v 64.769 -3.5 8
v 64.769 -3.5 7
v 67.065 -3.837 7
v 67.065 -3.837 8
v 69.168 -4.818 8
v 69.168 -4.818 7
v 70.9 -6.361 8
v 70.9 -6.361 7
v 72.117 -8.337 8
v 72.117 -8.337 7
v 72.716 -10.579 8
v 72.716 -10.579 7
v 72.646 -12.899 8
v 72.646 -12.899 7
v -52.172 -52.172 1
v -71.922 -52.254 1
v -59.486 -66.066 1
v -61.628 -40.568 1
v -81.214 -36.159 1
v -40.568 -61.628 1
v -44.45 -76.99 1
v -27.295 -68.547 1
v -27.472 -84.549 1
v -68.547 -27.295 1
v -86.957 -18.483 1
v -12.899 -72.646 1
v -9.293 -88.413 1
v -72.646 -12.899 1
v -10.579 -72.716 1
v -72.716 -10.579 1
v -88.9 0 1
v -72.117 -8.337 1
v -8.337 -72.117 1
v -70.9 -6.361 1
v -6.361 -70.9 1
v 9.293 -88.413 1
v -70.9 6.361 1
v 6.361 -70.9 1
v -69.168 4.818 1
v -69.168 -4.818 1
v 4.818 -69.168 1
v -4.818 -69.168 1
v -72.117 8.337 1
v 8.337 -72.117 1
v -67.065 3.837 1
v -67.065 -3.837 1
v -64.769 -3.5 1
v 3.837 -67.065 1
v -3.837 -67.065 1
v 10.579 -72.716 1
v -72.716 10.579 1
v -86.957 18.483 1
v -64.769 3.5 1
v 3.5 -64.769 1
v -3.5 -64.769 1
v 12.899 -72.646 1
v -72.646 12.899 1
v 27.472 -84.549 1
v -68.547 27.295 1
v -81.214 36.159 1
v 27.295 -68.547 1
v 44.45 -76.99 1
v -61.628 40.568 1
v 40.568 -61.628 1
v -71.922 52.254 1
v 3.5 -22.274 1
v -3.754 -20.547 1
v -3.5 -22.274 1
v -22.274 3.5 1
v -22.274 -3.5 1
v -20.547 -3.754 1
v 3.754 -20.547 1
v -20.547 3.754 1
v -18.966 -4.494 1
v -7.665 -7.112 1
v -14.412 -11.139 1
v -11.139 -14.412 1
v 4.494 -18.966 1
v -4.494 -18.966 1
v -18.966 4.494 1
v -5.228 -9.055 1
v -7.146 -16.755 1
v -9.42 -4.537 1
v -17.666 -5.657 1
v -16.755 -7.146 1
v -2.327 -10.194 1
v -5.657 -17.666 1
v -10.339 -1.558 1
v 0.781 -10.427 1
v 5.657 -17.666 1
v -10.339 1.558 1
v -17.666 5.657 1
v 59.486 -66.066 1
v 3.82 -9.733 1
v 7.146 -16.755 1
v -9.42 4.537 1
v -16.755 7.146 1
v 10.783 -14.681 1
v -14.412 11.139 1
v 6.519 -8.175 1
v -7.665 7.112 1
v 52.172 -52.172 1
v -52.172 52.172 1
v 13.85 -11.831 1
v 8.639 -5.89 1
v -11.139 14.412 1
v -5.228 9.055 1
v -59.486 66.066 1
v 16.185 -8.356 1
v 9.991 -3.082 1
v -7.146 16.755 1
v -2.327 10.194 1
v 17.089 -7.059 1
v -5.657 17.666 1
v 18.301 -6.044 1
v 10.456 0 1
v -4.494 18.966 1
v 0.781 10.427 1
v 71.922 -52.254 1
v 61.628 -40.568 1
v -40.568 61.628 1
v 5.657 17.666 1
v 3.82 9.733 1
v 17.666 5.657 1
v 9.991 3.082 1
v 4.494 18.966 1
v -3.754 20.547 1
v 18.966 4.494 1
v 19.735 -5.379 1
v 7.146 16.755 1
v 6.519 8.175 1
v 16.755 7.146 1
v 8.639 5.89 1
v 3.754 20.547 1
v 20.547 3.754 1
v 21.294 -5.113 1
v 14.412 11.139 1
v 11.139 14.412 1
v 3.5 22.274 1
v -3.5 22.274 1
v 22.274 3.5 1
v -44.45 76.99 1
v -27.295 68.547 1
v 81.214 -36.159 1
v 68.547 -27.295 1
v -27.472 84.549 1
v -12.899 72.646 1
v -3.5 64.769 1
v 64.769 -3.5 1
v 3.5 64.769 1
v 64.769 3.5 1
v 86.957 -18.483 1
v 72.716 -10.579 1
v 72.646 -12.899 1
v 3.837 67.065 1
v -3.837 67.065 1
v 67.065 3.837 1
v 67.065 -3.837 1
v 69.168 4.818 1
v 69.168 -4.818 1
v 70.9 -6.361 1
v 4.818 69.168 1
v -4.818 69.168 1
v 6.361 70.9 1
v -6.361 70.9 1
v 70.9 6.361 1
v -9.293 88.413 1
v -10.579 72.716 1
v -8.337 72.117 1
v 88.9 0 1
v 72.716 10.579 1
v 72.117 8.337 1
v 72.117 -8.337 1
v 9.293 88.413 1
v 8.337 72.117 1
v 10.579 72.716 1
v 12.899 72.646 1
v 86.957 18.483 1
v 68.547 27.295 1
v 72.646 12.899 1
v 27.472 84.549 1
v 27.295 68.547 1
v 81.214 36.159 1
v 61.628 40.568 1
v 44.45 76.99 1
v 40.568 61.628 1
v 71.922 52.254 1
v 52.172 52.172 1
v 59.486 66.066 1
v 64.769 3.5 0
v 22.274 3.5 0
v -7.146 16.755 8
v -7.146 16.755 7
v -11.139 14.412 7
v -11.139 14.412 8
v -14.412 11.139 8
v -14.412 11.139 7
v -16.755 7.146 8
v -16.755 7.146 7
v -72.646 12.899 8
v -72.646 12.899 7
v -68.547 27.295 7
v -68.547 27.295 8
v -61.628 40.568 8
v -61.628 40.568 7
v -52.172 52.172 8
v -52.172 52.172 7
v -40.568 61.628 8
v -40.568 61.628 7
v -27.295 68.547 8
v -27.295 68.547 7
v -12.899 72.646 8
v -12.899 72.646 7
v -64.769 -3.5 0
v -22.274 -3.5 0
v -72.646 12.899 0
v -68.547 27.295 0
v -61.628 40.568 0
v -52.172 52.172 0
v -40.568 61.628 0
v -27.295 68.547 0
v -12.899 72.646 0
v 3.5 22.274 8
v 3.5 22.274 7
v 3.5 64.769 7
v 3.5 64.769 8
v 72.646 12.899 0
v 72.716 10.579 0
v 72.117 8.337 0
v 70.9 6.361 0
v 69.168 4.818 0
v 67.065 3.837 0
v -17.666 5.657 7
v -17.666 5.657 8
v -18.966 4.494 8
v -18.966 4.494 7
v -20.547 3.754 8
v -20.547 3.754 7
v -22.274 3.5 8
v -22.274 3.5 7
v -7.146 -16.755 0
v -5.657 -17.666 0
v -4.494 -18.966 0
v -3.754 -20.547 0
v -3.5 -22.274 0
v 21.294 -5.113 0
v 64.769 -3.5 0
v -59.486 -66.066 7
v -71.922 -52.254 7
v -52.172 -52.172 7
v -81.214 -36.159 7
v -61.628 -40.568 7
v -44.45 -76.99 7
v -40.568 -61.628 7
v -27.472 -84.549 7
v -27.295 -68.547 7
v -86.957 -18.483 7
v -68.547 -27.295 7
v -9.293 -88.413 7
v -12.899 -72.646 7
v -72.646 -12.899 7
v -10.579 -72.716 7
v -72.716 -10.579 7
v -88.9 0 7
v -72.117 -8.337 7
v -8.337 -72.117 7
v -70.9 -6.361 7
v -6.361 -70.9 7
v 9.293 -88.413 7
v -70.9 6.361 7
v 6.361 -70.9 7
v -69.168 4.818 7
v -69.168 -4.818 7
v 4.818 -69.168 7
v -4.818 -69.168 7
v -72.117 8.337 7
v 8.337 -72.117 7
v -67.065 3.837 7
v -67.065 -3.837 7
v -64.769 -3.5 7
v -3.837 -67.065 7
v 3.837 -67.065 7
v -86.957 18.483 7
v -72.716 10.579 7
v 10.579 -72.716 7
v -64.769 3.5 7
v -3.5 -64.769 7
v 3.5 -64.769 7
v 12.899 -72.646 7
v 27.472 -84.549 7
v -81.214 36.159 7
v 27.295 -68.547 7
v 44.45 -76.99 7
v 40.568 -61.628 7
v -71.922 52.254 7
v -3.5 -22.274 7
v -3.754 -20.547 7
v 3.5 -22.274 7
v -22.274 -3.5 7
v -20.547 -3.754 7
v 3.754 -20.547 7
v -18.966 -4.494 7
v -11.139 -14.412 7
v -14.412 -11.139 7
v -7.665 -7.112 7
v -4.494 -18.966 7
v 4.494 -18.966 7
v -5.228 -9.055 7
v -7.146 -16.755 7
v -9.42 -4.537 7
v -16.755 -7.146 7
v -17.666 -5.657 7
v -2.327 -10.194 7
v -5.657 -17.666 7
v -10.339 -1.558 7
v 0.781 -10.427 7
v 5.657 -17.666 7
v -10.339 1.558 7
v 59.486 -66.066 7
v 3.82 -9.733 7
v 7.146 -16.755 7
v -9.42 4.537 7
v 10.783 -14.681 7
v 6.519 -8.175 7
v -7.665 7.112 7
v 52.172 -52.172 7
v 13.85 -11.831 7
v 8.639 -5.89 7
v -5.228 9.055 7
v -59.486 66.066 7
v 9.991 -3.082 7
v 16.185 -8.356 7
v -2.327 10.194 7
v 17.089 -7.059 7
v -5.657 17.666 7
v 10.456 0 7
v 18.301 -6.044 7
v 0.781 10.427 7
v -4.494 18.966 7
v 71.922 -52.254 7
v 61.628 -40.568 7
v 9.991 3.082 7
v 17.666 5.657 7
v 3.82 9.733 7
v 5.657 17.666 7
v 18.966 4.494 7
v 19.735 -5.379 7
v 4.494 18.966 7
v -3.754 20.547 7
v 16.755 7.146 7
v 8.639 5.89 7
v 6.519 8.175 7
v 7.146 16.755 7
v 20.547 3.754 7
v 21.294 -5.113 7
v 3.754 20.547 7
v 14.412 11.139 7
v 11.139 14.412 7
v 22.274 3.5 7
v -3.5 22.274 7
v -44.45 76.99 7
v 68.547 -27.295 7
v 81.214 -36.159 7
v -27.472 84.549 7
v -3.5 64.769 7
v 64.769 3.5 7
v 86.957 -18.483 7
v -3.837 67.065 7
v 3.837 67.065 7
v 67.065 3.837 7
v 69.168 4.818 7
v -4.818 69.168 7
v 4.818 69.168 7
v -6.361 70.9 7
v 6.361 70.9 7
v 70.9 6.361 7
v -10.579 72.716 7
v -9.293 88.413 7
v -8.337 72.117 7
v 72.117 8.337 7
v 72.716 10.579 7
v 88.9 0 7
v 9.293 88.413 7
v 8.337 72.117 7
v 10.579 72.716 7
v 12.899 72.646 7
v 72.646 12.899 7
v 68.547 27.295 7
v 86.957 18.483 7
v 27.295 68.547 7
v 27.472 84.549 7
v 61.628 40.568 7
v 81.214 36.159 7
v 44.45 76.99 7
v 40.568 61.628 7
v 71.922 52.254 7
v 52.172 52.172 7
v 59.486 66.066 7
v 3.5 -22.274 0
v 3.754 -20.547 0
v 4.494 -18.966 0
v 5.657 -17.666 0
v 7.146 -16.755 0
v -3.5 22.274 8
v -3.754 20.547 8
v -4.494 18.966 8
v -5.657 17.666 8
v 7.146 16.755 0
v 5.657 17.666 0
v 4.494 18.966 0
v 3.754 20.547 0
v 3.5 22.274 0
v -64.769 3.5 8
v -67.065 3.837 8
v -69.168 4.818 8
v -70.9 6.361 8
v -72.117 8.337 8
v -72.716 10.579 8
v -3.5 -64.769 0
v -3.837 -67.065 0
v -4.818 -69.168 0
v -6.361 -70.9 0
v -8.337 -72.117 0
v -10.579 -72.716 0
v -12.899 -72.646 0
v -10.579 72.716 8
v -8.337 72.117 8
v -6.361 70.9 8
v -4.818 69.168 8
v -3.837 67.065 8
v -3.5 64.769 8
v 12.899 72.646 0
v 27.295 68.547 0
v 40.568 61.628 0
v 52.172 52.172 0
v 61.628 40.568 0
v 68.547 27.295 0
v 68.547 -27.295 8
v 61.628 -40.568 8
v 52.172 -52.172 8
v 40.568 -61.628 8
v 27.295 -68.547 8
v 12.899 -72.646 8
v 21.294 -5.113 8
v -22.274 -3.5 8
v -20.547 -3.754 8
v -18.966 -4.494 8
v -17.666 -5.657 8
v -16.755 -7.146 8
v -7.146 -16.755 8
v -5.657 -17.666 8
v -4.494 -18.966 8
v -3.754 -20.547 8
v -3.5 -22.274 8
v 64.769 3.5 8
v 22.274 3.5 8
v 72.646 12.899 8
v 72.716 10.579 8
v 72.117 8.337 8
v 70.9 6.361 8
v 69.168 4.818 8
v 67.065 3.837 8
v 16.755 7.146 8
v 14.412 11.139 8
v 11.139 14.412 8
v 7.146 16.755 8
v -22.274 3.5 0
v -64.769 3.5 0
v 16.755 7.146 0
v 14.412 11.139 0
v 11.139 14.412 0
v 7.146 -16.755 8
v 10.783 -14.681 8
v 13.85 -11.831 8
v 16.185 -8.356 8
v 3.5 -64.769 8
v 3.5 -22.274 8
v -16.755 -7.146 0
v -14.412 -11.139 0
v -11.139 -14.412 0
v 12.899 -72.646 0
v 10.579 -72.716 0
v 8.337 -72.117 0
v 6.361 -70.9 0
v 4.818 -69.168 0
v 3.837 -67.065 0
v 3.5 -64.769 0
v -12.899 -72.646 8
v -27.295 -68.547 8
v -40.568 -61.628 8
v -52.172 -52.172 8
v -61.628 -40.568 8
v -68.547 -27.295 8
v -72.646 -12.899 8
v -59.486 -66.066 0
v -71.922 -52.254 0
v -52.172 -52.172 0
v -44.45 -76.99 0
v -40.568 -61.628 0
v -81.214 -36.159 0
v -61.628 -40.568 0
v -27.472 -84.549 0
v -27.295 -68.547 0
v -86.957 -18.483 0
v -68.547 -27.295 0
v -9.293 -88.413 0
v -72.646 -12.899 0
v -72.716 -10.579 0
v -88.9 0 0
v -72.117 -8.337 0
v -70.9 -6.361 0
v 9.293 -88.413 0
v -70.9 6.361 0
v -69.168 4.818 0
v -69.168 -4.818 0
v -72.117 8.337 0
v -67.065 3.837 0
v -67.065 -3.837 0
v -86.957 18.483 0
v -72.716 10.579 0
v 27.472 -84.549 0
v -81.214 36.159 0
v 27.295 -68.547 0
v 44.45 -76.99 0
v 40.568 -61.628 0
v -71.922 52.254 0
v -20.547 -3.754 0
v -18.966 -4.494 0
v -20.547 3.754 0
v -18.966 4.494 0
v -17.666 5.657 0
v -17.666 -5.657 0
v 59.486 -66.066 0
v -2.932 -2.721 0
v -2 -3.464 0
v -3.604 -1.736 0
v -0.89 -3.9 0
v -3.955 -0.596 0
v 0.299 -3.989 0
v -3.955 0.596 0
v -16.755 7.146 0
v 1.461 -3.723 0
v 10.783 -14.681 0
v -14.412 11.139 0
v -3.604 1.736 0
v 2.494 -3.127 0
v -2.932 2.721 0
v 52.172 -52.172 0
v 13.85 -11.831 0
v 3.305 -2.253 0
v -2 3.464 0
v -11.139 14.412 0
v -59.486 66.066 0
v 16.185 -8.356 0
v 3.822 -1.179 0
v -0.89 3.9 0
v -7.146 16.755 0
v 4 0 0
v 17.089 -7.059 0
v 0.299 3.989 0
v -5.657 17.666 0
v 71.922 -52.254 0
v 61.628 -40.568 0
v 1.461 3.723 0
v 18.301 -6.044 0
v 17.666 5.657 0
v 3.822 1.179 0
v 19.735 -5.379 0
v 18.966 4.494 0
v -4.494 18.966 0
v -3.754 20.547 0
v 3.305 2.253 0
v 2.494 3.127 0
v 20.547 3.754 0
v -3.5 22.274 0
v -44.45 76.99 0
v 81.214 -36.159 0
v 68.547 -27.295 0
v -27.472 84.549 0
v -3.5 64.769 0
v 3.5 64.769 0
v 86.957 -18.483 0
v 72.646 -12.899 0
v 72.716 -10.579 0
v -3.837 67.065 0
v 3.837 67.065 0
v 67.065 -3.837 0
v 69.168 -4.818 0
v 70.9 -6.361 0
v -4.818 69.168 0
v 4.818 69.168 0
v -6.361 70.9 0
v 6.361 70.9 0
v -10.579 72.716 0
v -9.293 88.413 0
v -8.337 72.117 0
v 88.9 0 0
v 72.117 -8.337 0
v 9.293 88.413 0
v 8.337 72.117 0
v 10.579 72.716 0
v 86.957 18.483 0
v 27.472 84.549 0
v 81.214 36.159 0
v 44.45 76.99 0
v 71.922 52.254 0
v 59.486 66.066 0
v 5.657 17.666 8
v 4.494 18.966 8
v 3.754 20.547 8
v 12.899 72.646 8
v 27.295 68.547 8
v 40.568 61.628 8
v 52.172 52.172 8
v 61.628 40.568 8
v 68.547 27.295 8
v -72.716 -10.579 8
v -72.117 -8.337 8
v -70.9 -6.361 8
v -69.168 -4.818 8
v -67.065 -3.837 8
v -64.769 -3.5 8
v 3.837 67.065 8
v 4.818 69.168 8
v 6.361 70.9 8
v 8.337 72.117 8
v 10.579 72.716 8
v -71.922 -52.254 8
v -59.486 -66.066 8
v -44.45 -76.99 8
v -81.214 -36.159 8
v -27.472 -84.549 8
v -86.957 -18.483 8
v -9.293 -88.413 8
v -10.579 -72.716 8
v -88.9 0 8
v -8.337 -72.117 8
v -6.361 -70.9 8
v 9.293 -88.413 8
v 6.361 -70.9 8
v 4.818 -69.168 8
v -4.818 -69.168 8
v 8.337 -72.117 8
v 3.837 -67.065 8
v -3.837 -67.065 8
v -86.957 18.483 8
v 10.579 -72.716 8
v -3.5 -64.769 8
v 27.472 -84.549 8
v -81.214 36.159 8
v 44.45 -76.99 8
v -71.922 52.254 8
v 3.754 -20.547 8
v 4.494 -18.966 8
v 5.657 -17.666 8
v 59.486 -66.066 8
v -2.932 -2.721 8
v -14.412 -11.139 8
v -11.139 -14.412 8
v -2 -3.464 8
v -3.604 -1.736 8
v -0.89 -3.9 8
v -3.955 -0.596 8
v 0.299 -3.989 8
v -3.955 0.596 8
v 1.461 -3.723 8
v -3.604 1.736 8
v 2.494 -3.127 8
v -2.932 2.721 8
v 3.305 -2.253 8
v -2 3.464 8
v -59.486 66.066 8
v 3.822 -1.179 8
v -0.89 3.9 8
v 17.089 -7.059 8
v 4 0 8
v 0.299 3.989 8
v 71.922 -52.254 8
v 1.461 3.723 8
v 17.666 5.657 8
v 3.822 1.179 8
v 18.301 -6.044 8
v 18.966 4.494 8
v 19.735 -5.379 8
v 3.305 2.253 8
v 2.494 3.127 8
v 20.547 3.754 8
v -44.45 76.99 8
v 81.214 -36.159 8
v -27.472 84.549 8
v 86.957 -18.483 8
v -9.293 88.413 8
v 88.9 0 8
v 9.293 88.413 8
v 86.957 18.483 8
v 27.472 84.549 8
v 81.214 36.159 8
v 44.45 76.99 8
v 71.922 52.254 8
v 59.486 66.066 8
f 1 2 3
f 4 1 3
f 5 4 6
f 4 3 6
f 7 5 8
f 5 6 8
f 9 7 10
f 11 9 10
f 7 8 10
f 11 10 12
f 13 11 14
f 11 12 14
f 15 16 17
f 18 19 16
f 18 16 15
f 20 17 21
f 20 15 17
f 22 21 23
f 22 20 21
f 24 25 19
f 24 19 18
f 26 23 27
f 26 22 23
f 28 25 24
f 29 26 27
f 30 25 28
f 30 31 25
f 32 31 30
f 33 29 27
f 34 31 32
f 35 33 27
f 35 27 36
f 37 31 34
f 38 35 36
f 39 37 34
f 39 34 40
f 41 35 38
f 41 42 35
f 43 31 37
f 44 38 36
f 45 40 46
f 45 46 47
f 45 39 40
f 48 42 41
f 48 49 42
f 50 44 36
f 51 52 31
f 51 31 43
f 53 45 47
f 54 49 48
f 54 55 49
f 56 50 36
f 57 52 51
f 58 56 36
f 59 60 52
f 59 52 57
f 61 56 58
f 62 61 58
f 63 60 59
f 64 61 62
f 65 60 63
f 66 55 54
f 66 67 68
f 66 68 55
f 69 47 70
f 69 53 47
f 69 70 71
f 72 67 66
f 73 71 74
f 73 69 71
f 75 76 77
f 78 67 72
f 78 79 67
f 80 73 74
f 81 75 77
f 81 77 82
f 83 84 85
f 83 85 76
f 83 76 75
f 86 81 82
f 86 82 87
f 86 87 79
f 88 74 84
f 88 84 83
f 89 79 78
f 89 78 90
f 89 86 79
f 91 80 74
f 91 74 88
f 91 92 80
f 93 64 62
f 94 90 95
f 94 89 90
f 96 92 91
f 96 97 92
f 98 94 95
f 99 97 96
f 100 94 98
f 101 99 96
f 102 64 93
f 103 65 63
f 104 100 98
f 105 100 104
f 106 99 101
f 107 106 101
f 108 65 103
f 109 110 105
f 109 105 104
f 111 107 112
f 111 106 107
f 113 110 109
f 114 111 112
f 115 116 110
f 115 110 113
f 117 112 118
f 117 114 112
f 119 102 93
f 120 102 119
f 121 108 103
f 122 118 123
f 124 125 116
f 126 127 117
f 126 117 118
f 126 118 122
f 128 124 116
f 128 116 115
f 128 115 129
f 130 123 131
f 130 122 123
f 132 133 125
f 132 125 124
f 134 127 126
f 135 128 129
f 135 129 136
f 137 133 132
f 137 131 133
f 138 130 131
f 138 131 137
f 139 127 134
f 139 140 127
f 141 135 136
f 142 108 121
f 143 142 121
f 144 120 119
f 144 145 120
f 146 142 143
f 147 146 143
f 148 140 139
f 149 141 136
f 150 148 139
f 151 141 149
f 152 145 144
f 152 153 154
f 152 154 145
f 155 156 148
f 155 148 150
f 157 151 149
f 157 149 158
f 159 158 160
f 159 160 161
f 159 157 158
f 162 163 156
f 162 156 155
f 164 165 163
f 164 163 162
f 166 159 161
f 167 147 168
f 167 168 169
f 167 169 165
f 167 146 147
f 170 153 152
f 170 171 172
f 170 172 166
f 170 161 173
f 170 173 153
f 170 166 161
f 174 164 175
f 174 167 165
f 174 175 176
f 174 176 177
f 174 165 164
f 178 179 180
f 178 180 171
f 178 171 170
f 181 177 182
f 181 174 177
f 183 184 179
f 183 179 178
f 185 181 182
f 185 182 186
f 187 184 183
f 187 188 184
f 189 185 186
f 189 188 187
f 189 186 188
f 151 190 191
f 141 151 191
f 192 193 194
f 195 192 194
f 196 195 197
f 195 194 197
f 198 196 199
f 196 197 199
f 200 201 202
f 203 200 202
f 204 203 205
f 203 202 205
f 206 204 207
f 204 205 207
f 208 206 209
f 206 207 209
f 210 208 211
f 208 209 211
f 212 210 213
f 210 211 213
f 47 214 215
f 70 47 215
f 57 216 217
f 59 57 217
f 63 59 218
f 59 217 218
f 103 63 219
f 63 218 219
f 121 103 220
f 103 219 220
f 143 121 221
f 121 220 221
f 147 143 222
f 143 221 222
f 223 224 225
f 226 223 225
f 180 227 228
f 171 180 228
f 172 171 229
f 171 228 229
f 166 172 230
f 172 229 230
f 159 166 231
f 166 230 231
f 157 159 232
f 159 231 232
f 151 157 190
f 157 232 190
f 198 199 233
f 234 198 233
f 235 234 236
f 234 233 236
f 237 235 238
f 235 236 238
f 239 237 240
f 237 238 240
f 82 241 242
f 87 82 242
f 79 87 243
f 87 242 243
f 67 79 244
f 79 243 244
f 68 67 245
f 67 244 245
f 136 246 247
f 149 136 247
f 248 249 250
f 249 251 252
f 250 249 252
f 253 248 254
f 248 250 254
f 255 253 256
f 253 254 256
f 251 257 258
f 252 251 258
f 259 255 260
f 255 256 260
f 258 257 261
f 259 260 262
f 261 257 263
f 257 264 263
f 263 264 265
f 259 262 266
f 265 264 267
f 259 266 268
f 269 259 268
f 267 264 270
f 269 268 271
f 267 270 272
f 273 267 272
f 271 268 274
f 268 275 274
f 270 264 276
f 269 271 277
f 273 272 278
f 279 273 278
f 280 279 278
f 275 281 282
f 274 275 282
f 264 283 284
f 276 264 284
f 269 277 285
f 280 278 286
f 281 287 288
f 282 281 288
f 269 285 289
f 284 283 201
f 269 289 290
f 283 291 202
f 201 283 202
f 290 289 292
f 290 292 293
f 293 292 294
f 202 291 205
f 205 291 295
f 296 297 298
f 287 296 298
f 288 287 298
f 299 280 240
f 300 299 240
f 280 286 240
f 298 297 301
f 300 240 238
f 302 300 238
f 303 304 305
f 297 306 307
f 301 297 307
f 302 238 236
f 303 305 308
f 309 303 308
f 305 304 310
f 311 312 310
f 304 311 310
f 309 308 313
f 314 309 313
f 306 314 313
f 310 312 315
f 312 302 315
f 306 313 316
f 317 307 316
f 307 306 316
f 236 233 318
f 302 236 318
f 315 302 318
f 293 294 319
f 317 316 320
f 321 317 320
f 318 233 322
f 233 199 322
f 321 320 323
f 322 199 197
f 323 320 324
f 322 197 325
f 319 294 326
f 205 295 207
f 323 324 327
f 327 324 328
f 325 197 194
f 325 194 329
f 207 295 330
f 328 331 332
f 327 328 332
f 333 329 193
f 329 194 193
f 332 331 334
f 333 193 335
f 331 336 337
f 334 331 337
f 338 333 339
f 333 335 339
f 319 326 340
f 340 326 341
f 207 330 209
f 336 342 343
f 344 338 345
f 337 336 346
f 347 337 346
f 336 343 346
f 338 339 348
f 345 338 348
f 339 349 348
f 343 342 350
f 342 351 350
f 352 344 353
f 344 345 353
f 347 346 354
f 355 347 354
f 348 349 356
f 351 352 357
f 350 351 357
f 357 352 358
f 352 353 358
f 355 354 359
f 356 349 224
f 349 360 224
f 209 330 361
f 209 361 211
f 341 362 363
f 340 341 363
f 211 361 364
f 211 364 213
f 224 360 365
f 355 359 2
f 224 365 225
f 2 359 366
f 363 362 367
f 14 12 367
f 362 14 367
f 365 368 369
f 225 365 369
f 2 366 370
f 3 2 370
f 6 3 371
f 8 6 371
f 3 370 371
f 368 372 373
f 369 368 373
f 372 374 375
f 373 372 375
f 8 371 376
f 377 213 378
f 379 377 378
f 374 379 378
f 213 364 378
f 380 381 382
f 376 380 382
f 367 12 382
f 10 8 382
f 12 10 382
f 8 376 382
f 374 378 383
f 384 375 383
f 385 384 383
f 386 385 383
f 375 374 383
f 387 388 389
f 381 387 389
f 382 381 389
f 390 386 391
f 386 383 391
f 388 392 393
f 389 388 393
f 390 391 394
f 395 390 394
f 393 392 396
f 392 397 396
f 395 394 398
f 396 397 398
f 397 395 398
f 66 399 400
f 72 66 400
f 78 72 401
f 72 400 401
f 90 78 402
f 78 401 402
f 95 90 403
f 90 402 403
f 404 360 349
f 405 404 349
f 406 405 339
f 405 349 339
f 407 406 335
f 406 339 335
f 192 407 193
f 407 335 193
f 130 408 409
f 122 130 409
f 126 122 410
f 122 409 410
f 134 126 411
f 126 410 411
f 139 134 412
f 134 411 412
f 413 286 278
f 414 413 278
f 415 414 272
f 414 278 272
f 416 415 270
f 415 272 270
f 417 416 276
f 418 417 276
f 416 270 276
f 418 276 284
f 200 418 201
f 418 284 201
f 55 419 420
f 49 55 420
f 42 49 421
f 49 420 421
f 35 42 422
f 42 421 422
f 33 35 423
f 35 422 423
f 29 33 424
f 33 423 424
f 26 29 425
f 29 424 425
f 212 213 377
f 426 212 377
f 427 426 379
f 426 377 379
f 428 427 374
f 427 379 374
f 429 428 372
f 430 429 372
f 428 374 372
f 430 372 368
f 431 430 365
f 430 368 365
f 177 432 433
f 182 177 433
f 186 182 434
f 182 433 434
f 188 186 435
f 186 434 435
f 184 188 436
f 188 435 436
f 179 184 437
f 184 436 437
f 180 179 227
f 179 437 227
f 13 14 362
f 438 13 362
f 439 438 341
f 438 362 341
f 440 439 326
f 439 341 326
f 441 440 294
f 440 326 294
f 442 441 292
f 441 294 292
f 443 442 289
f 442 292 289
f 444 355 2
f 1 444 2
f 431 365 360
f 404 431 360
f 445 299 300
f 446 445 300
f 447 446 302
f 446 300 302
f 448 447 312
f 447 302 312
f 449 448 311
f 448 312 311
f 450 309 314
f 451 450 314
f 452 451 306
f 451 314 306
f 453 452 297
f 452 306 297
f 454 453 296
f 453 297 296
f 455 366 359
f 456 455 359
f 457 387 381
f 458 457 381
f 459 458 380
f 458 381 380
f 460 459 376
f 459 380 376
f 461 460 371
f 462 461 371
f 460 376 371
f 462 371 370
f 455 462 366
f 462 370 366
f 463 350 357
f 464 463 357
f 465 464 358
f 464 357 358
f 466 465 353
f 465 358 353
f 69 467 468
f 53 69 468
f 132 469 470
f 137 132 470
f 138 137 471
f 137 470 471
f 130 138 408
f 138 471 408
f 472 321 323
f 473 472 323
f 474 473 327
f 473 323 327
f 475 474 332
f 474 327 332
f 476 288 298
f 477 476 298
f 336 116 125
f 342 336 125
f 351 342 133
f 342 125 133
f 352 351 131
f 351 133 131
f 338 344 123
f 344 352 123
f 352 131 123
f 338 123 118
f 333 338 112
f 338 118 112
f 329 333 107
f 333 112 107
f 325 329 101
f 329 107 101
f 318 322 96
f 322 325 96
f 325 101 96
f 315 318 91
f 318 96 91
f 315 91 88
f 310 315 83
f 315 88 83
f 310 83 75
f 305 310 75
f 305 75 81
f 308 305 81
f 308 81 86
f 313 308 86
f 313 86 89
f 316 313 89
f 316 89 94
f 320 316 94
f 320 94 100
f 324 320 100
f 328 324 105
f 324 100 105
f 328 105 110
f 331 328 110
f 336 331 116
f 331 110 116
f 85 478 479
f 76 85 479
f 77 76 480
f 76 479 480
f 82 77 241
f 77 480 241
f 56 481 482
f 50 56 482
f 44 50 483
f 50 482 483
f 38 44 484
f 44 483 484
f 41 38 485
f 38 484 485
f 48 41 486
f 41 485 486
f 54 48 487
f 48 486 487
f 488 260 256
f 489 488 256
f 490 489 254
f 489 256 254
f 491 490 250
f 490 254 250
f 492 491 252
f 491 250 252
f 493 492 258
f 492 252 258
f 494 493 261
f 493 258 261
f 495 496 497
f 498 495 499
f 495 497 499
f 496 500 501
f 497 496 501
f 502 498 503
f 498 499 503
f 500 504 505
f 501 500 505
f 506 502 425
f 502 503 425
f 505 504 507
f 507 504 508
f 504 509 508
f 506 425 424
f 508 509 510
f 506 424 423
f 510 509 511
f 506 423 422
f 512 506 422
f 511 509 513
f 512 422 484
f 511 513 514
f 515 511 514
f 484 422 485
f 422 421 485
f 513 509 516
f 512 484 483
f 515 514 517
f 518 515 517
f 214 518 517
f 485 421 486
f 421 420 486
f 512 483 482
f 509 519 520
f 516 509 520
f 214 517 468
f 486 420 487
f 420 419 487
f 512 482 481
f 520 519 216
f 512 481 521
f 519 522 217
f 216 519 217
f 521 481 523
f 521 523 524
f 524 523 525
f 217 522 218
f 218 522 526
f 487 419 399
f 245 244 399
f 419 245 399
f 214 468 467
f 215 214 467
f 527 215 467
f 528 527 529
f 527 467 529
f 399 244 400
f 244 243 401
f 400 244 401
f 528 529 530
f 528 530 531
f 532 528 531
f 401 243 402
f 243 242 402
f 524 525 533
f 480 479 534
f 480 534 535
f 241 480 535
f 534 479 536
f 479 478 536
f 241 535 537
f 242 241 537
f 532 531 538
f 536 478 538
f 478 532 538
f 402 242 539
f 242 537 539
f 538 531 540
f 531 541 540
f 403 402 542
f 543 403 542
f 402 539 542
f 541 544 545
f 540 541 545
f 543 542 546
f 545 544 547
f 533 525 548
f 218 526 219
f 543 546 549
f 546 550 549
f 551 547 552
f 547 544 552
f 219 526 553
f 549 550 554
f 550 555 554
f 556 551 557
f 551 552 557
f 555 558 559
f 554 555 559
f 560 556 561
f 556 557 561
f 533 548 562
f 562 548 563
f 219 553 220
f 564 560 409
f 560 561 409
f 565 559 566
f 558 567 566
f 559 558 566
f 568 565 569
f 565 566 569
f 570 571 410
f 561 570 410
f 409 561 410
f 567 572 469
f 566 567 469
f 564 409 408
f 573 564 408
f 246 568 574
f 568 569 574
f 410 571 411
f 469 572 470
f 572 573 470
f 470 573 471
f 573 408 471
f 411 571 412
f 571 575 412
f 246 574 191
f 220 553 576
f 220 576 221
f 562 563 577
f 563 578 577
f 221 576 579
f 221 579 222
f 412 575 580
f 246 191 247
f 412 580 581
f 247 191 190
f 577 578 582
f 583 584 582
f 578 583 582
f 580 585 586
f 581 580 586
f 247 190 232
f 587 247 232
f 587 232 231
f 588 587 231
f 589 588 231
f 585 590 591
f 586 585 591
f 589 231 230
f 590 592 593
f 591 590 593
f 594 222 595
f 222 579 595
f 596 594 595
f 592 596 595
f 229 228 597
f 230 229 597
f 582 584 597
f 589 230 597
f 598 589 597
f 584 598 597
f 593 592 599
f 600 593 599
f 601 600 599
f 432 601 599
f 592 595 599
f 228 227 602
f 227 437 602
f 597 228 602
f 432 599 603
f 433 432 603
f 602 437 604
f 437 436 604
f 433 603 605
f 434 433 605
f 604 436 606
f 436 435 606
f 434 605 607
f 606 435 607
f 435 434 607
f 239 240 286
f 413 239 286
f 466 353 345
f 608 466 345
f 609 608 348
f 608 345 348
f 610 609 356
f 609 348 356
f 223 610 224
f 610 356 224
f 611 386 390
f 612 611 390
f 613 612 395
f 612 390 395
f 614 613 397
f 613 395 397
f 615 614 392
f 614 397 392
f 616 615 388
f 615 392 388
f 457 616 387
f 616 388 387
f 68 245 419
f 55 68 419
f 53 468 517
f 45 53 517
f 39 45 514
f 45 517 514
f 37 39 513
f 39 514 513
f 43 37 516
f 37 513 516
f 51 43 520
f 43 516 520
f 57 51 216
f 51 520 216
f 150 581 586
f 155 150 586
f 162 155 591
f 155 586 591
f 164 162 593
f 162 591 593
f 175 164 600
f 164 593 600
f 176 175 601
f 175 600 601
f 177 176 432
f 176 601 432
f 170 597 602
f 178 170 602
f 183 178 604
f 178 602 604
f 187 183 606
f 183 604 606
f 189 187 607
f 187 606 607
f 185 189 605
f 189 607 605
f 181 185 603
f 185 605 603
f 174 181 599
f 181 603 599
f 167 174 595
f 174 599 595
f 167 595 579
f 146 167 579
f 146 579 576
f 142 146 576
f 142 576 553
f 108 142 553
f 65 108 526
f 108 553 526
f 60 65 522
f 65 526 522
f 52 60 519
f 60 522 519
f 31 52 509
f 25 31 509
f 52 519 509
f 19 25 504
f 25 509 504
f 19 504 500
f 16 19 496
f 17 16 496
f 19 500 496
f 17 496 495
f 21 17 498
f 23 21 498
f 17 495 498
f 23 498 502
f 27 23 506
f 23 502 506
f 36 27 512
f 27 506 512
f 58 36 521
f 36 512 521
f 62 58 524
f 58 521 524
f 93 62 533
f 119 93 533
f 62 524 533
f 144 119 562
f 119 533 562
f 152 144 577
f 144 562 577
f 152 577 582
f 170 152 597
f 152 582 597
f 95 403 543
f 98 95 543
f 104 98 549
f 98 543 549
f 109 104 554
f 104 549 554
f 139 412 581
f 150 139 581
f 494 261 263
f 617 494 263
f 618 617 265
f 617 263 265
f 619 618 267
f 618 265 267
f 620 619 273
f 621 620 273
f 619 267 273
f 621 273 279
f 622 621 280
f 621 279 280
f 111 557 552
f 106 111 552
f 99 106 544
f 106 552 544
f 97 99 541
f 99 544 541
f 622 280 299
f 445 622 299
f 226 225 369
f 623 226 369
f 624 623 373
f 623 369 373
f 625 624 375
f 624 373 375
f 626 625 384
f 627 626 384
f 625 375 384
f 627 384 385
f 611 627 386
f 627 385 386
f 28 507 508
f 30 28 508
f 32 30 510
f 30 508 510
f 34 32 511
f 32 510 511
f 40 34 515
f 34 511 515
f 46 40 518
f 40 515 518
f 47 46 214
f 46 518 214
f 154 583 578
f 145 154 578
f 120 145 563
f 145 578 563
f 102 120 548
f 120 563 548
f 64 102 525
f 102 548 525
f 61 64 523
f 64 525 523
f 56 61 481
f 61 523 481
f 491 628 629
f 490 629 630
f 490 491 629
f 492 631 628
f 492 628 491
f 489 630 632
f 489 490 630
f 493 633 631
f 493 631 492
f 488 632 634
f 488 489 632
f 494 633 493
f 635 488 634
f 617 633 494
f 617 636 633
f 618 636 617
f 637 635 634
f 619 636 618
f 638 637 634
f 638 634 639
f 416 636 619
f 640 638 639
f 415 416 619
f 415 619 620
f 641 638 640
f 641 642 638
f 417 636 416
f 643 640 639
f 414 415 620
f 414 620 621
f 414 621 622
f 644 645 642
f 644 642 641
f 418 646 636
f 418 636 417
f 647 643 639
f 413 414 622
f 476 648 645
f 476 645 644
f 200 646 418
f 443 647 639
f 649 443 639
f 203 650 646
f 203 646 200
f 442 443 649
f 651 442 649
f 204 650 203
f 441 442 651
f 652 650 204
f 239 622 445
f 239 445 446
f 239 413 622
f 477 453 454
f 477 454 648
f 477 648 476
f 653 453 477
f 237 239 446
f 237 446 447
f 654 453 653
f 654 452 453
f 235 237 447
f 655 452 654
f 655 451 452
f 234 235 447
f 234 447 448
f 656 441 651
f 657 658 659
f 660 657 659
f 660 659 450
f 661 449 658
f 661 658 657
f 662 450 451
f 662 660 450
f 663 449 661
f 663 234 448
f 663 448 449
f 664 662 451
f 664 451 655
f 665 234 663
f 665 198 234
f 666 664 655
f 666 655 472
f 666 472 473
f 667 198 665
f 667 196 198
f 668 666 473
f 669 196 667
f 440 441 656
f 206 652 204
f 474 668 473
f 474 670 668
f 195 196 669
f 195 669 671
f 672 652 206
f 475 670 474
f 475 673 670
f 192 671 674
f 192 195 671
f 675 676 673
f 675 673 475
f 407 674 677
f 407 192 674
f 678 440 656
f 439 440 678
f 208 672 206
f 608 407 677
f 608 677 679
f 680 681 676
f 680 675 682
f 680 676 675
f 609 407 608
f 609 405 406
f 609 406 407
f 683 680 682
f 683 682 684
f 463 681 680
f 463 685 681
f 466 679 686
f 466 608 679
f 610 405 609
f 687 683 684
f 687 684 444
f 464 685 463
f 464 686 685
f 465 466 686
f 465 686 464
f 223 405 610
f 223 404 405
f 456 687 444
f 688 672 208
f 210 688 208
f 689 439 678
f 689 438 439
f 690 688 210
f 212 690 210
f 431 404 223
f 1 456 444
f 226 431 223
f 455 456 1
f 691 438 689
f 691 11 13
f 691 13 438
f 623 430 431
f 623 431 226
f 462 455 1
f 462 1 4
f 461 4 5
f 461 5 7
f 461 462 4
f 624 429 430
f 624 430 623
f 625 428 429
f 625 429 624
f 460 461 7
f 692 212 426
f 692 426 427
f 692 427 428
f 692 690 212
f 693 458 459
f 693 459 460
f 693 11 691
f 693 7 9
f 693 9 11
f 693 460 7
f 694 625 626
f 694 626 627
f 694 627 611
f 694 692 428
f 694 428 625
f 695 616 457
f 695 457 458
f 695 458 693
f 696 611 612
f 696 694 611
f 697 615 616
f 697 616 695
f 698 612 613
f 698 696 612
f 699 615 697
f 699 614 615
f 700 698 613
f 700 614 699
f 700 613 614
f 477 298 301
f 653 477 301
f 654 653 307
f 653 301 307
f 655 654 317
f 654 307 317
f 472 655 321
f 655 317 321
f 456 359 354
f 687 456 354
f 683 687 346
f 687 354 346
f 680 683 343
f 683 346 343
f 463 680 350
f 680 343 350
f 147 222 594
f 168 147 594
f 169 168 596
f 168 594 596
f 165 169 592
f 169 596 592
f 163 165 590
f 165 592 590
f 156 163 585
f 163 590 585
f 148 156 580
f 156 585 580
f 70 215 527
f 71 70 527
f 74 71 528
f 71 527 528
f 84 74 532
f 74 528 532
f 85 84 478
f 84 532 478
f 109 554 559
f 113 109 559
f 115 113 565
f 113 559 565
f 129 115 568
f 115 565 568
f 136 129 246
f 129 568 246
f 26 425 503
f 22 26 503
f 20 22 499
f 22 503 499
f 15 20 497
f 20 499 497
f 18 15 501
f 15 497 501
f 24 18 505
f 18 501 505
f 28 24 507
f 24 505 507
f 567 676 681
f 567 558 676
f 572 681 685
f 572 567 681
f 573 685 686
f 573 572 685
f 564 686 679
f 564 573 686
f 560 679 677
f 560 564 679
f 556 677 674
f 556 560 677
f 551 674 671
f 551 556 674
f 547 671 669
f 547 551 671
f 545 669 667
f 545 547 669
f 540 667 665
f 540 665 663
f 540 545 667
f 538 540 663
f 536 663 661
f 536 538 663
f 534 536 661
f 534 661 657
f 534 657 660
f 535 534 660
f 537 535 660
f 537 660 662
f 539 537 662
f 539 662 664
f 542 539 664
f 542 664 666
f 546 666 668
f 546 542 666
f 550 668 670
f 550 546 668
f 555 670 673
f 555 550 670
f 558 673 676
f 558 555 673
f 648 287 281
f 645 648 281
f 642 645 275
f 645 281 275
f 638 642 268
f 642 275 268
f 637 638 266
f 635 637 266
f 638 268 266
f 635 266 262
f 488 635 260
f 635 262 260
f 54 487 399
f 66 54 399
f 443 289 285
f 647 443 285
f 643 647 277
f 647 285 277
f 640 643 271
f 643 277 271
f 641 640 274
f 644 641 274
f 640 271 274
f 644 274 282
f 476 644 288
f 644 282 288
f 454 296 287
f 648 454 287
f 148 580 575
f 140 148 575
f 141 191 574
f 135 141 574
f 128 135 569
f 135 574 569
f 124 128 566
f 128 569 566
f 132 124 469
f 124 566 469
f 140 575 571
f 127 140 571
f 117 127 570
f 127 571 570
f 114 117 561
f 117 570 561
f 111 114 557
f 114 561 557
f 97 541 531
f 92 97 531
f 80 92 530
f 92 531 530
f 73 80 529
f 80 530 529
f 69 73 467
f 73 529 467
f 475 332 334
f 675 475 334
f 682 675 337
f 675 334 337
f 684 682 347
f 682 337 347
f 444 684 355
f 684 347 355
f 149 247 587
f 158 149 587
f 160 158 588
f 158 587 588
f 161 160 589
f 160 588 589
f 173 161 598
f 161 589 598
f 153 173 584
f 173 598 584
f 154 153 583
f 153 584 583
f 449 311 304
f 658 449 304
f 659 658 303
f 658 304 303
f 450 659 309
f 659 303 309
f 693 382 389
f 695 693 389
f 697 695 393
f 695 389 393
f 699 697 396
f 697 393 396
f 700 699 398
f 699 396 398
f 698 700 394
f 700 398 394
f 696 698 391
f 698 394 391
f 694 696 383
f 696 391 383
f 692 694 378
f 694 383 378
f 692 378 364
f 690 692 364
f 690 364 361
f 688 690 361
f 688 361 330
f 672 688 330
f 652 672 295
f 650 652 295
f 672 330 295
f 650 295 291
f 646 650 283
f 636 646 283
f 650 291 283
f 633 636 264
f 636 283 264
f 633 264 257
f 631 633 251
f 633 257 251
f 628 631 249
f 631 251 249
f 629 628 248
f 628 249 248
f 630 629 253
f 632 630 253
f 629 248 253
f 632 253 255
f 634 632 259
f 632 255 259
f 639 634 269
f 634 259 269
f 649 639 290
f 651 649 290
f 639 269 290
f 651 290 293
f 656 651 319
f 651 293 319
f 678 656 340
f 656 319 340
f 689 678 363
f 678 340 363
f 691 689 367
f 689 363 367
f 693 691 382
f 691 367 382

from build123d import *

# Parameters (mm, degrees)
F0_R     = 88.9
F0_R_2   = 10.45593
F0_R_3   = 4
F1_DEPTH = 1
F4_DEPTH = 8
F3_R     = 88.9
F3_R_2   = 4
F5_DEPTH = 1


with BuildPart() as f1:
    # F0 (on Top) → F1 (new body)
    with BuildSketch(Plane.XY):
        Circle(F0_R)
        with BuildLine():
            ThreePointArc((-72.645684, -12.898561), (-70.900296, -6.361347), (-64.768881, -3.5))
            Line((-64.768881, -3.5), (-22.273598, -3.5))
            ThreePointArc((-22.273598, -3.5), (-18.966296, -4.493828), (-16.754625, -7.146081))
            ThreePointArc((-16.754625, -7.146081), (-12.879905, -12.879905), (-7.146081, -16.754625))
            ThreePointArc((-7.146081, -16.754625), (-4.493828, -18.966296), (-3.5, -22.273598))
            Line((-3.5, -22.273598), (-3.5, -64.768881))
            ThreePointArc((-3.5, -64.768881), (-6.361347, -70.900296), (-12.898561, -72.645684))
            ThreePointArc((-12.898561, -72.645684), (-52.17168, -52.17168), (-72.645684, -12.898561))
        make_face(mode=Mode.SUBTRACT)
        with BuildLine():
            ThreePointArc((72.645684, -12.898561), (52.17168, -52.17168), (12.898561, -72.645684))
            ThreePointArc((12.898561, -72.645684), (6.361347, -70.900296), (3.5, -64.768881))
            Line((3.5, -64.768881), (3.5, -22.273598))
            ThreePointArc((3.5, -22.273598), (4.493828, -18.966296), (7.146081, -16.754625))
            ThreePointArc((7.146081, -16.754625), (12.398278, -13.344161), (16.184999, -8.356418))
            ThreePointArc((16.184999, -8.356418), (18.300608, -6.043543), (21.29386, -5.113148))
            Line((21.29386, -5.113148), (64.768881, -3.5))
            ThreePointArc((64.768881, -3.5), (70.900296, -6.361347), (72.645684, -12.898561))
        make_face(mode=Mode.SUBTRACT)
        with BuildLine():
            ThreePointArc((-72.645684, 12.898561), (-52.17168, 52.17168), (-12.898561, 72.645684))
            ThreePointArc((-12.898561, 72.645684), (-6.361347, 70.900296), (-3.5, 64.768881))
            Line((-3.5, 64.768881), (-3.5, 22.273598))
            ThreePointArc((-3.5, 22.273598), (-4.493828, 18.966296), (-7.146081, 16.754625))
            ThreePointArc((-7.146081, 16.754625), (-12.879905, 12.879905), (-16.754625, 7.146081))
            ThreePointArc((-16.754625, 7.146081), (-18.966296, 4.493828), (-22.273598, 3.5))
            Line((-22.273598, 3.5), (-64.768881, 3.5))
            ThreePointArc((-64.768881, 3.5), (-70.900296, 6.361347), (-72.645684, 12.898561))
        make_face(mode=Mode.SUBTRACT)
        Circle(F0_R_2, mode=Mode.SUBTRACT)
        with BuildLine():
            Line((3.5, 22.273598), (3.5, 64.768881))
            ThreePointArc((3.5, 64.768881), (6.361347, 70.900296), (12.898561, 72.645684))
            ThreePointArc((12.898561, 72.645684), (52.17168, 52.17168), (72.645684, 12.898561))
            ThreePointArc((72.645684, 12.898561), (70.900296, 6.361347), (64.768881, 3.5))
            Line((64.768881, 3.5), (22.273598, 3.5))
            ThreePointArc((22.273598, 3.5), (18.966296, 4.493828), (16.754625, 7.146081))
            ThreePointArc((16.754625, 7.146081), (12.879905, 12.879905), (7.146081, 16.754625))
            ThreePointArc((7.146081, 16.754625), (4.493828, 18.966296), (3.5, 22.273598))
        make_face(mode=Mode.SUBTRACT)
        Circle(F0_R_2)
        Circle(F0_R_3, mode=Mode.SUBTRACT)
    extrude(amount=F1_DEPTH)

    # F0 (on Top) → F4 (join)
    with BuildSketch(Plane.XY):
        Circle(F0_R_2)
        Circle(F0_R_3, mode=Mode.SUBTRACT)
    extrude(amount=F4_DEPTH)

    # F3 (on offset) → F5 (join)
    with BuildSketch(Plane.XY.offset(7)):
        Circle(F3_R)
        with BuildLine():
            Line((-3.5, -22.273598), (-3.5, -64.768881))
            ThreePointArc((-3.5, -64.768881), (-6.361347, -70.900296), (-12.898561, -72.645684))
            ThreePointArc((-12.898561, -72.645684), (-52.17168, -52.17168), (-72.645684, -12.898561))
            ThreePointArc((-72.645684, -12.898561), (-70.900296, -6.361347), (-64.768881, -3.5))
            Line((-64.768881, -3.5), (-22.273598, -3.5))
            ThreePointArc((-22.273598, -3.5), (-18.966296, -4.493828), (-16.754625, -7.146081))
            ThreePointArc((-16.754625, -7.146081), (-12.879905, -12.879905), (-7.146081, -16.754625))
            ThreePointArc((-7.146081, -16.754625), (-4.493828, -18.966296), (-3.5, -22.273598))
        make_face(mode=Mode.SUBTRACT)
        with BuildLine():
            ThreePointArc((7.146081, -16.754625), (12.398278, -13.344161), (16.184999, -8.356418))
            ThreePointArc((16.184999, -8.356418), (18.300608, -6.043543), (21.29386, -5.113148))
            Line((21.29386, -5.113148), (64.768881, -3.5))
            ThreePointArc((64.768881, -3.5), (70.900296, -6.361347), (72.645684, -12.898561))
            ThreePointArc((72.645684, -12.898561), (52.17168, -52.17168), (12.898561, -72.645684))
            ThreePointArc((12.898561, -72.645684), (6.361347, -70.900296), (3.5, -64.768881))
            Line((3.5, -64.768881), (3.5, -22.273598))
            ThreePointArc((3.5, -22.273598), (4.493828, -18.966296), (7.146081, -16.754625))
        make_face(mode=Mode.SUBTRACT)
        with BuildLine():
            ThreePointArc((-7.146081, 16.754625), (-12.879905, 12.879905), (-16.754625, 7.146081))
            ThreePointArc((-16.754625, 7.146081), (-18.966296, 4.493828), (-22.273598, 3.5))
            Line((-22.273598, 3.5), (-64.768881, 3.5))
            ThreePointArc((-64.768881, 3.5), (-70.900296, 6.361347), (-72.645684, 12.898561))
            ThreePointArc((-72.645684, 12.898561), (-52.17168, 52.17168), (-12.898561, 72.645684))
            ThreePointArc((-12.898561, 72.645684), (-6.361347, 70.900296), (-3.5, 64.768881))
            Line((-3.5, 64.768881), (-3.5, 22.273598))
            ThreePointArc((-3.5, 22.273598), (-4.493828, 18.966296), (-7.146081, 16.754625))
        make_face(mode=Mode.SUBTRACT)
        Circle(F3_R_2, mode=Mode.SUBTRACT)
        with BuildLine():
            ThreePointArc((16.754625, 7.146081), (12.879905, 12.879905), (7.146081, 16.754625))
            ThreePointArc((7.146081, 16.754625), (4.493828, 18.966296), (3.5, 22.273598))
            Line((3.5, 22.273598), (3.5, 64.768881))
            ThreePointArc((3.5, 64.768881), (6.361347, 70.900296), (12.898561, 72.645684))
            ThreePointArc((12.898561, 72.645684), (52.17168, 52.17168), (72.645684, 12.898561))
            ThreePointArc((72.645684, 12.898561), (70.900296, 6.361347), (64.768881, 3.5))
            Line((64.768881, 3.5), (22.273598, 3.5))
            ThreePointArc((22.273598, 3.5), (18.966296, 4.493828), (16.754625, 7.146081))
        make_face(mode=Mode.SUBTRACT)
    extrude(amount=F5_DEPTH)


solid = f1.part
